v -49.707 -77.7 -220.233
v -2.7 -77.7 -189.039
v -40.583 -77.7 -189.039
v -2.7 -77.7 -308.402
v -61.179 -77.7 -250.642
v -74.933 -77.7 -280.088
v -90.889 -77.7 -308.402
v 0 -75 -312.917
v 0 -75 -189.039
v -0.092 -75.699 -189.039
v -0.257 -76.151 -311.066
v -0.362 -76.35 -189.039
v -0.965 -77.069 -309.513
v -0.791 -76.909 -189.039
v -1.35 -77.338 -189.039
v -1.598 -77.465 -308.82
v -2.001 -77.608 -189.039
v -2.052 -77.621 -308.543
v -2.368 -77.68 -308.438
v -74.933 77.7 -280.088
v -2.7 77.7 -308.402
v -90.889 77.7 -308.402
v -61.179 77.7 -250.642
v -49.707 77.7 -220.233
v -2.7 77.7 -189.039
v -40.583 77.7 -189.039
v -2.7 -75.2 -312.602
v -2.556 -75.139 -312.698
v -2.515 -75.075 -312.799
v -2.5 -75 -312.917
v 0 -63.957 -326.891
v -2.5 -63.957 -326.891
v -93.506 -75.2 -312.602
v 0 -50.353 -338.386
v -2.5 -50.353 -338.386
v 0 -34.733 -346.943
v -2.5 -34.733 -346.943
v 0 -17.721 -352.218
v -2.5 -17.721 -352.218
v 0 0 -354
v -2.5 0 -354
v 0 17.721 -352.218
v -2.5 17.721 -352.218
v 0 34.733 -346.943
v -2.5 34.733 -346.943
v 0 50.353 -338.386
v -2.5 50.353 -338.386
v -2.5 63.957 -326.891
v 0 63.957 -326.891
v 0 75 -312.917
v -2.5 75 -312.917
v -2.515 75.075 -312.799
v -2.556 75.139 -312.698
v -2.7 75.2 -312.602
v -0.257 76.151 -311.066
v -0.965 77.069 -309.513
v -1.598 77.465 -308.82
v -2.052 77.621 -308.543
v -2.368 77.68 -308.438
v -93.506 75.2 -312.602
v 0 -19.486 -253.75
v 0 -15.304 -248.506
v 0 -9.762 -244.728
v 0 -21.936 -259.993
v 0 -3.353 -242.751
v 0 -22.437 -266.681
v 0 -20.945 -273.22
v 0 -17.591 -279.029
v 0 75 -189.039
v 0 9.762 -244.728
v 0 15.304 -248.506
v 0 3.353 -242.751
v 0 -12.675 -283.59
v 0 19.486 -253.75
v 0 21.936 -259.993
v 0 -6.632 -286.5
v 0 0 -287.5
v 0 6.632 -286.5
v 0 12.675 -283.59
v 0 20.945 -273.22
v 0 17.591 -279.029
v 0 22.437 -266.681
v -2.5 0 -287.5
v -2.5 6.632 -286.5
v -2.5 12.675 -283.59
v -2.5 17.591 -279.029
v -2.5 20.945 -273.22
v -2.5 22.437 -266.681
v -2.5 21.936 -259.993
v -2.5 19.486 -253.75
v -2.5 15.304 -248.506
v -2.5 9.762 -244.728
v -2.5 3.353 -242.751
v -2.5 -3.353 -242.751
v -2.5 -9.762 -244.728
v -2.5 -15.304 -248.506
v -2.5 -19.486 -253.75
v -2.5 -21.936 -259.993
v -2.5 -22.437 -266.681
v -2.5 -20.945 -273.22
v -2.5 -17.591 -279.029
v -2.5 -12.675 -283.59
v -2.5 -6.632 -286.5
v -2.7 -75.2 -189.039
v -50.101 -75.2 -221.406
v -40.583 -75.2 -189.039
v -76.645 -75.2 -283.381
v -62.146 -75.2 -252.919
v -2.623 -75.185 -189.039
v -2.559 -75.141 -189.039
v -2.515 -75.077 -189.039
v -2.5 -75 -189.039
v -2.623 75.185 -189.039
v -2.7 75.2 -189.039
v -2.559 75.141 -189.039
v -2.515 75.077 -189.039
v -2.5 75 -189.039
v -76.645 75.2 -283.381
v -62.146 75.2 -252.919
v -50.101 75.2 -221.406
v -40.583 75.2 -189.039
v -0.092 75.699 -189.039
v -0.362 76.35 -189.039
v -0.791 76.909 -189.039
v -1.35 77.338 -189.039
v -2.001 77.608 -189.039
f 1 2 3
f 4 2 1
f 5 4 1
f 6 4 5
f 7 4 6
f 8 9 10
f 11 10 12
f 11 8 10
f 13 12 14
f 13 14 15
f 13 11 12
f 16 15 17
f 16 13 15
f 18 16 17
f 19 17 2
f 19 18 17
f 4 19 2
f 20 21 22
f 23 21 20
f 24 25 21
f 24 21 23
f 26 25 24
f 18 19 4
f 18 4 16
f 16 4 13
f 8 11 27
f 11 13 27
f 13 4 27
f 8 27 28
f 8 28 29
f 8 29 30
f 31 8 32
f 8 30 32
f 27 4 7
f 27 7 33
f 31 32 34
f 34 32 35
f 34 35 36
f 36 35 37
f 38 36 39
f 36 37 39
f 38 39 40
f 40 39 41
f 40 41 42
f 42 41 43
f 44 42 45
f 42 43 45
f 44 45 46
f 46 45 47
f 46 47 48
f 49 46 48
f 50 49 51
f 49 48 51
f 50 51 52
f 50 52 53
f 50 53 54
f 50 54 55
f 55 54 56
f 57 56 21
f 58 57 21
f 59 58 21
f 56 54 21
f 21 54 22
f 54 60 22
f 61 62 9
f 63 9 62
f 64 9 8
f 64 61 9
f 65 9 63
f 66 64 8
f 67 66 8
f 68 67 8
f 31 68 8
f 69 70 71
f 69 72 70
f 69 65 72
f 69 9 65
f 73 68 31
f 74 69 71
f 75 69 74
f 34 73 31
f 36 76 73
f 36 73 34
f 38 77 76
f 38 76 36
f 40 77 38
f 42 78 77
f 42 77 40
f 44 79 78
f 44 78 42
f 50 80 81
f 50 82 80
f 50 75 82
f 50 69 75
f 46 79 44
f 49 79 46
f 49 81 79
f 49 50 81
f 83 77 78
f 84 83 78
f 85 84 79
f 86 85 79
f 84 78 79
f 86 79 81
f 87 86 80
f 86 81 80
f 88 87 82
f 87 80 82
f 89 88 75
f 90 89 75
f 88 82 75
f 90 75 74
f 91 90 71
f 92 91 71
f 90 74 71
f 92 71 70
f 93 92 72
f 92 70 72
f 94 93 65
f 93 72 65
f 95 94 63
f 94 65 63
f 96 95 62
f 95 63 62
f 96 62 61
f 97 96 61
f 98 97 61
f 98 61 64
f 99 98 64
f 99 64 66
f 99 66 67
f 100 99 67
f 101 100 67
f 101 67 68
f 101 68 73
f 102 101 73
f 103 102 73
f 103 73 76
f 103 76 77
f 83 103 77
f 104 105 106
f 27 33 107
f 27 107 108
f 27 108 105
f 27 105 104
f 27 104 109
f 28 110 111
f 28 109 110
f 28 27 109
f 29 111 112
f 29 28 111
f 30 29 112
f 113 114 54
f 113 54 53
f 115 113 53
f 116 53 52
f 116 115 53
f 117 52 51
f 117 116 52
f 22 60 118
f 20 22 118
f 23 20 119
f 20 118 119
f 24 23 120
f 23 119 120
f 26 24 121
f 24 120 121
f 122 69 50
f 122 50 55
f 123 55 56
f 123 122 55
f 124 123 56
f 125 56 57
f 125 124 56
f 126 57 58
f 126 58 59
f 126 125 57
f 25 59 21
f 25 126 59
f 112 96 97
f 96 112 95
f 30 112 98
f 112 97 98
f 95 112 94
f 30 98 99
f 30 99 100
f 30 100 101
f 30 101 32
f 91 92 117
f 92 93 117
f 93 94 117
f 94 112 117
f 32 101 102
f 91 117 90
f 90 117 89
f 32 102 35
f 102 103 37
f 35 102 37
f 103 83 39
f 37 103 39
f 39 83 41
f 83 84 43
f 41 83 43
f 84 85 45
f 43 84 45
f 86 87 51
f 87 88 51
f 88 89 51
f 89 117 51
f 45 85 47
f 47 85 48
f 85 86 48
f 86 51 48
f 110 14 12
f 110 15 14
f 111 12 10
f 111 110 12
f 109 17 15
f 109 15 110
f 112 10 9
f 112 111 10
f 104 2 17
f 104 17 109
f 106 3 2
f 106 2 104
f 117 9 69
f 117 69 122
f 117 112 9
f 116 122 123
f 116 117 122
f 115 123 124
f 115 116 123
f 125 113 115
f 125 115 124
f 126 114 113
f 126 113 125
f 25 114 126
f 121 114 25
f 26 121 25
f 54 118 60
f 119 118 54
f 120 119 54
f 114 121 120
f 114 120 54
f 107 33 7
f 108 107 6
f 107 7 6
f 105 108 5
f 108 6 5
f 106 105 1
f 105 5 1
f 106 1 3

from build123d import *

# Parameters (mm, degrees)
SKETCH1_W               = 730
SKETCH1_H               = 150
BASE_FLANGE1_DEPTH      = 2.5
EDGE_FLANGE1_DEPTH      = 730
EDGE_FLANGE1_BEND_DEPTH = 730
CUT_EXTRUDE1_DEPTH      = 418.461567093
CUT_EXTRUDE1_DEPTH_BACK = 418.461567093
SKETCH12_R              = 434
SKETCH13_R              = 22.5
CUT_EXTRUDE2_DEPTH      = 10
CUT_EXTRUDE3_DEPTH      = 396.173746598
CUT_EXTRUDE3_DEPTH_BACK = 396.173746598
SKETCH14_W              = 631.337566112
SKETCH14_H              = 273.157514278
CUT_EXTRUDE4_DEPTH      = 396.173746598
CUT_EXTRUDE4_DEPTH_BACK = 396.173746598
CUT_EXTRUDE5_DEPTH      = 400.448552929


# Sheet-metal steps are written as plain solids
with BuildPart() as part:
    # Sketch1 → Base-Flange1 (new body)
    with BuildSketch(Plane(origin=(0, 0, 0), x_dir=(0, 0, -1), z_dir=(1, 0, 0))):
        Rectangle(SKETCH1_W, SKETCH1_H)
    extrude(amount=-BASE_FLANGE1_DEPTH)

    # Edge-Flange1 section (across the edge) → Edge-Flange1 (add)
    with BuildSketch(Plane(origin=(-2.5, 75.2, 365), x_dir=(0, -1, 0), z_dir=(0, 0, -1))):
        with BuildLine():
            Line((-2.5, 0.2), (-2.5, 127.5))
            Line((-2.5, 127.5), (0, 127.5))
            Line((0, 127.5), (0, 0.2))
            ThreePointArc((0, 0.2), (0.058578644, 0.058578644), (0.2, 0))
            Line((0.2, 0), (0.2, -2.5))
            ThreePointArc((0.2, -2.5), (-1.709188309, -1.709188309), (-2.5, 0.2))
        make_face()
    extrude(amount=EDGE_FLANGE1_DEPTH)

    # Edge-Flange1 section 2 (across the edge) → Edge-Flange1 bend (add)
    with BuildSketch(Plane(origin=(-2.5, -75.2, -365), x_dir=(0, 1, 0), z_dir=(0, 0, 1))):
        with BuildLine():
            Line((-2.5, 0.2), (-2.5, 127.5))
            Line((-2.5, 127.5), (0, 127.5))
            Line((0, 127.5), (0, 0.2))
            ThreePointArc((0, 0.2), (0.058578644, 0.058578644), (0.2, 0))
            Line((0.2, 0), (0.2, -2.5))
            ThreePointArc((0.2, -2.5), (-1.709188309, -1.709188309), (-2.5, 0.2))
        make_face()
    extrude(amount=EDGE_FLANGE1_BEND_DEPTH)

    # Sketch12 → Cut-Extrude1 (cut, two sides: drawn at the far end of the back side and taken through both)
    with BuildSketch(Plane(origin=(0, 77.7, 0), x_dir=(1, 0, 0), z_dir=(0, 1, 0)).offset(-CUT_EXTRUDE1_DEPTH_BACK)):
        with Locations((-470, 85)):
            Circle(SKETCH12_R)
    extrude(amount=CUT_EXTRUDE1_DEPTH + CUT_EXTRUDE1_DEPTH_BACK, mode=Mode.SUBTRACT)

    # Sketch13 → Cut-Extrude2 (cut)
    with BuildSketch(Plane(origin=(0, 0, 0), x_dir=(0, 0, -1), z_dir=(1, 0, 0))):
        with Locations((265, 0)):
            Circle(SKETCH13_R)
        with Locations((-290, 0)):
            Circle(SKETCH13_R)
    extrude(amount=-CUT_EXTRUDE2_DEPTH, mode=Mode.SUBTRACT)

    # Sketch14 → Cut-Extrude3 (cut, two sides: drawn at the far end of the back side and taken through both)
    with BuildSketch(Plane(origin=(0, 0, 0), x_dir=(0, 0, -1), z_dir=(1, 0, 0)).offset(-CUT_EXTRUDE3_DEPTH_BACK)):
        with Locations((-126.629311255, -14.019673746)):
            Rectangle(SKETCH14_W, SKETCH14_H)
    extrude(amount=CUT_EXTRUDE3_DEPTH + CUT_EXTRUDE3_DEPTH_BACK, mode=Mode.SUBTRACT)

    # Sketch15 → Cut-Extrude4 (cut, two sides: drawn at the far end of the back side and taken through both)
    with BuildSketch(Plane(origin=(0, 0, 0), x_dir=(0, 0, -1), z_dir=(1, 0, 0)).offset(-CUT_EXTRUDE4_DEPTH_BACK)):
        with BuildLine():
            Line((302.266550641, 80.822052704), (310.532003477, 105.351783703))
            Line((310.532003477, 105.351783703), (400.668447303, 94.566226322))
            Line((400.668447303, 94.566226322), (380.252927975, -108.048173048))
            Line((380.252927975, -108.048173048), (291.286888445, -85.029403714))
            ThreePointArc((291.286888445, -85.029403714), (353.805609642, -5.879089735), (302.266550641, 80.822052704))
        make_face()
    extrude(amount=CUT_EXTRUDE4_DEPTH + CUT_EXTRUDE4_DEPTH_BACK, mode=Mode.SUBTRACT)

    # Sketch16 → Cut-Extrude5 (cut, through all)
    with BuildSketch(Plane.XZ.offset(77.7)):
        with BuildLine():
            Line((-39.289490613, -183.753349909), (-75.528167694, -178.562999568))
            Line((-75.528167694, -178.562999568), (-125.004878412, -316.53047916))
            Line((-125.004878412, -316.53047916), (-101.585534734, -324.928922734))
            ThreePointArc((-101.585534734, -324.928922734), (-63.999675541, -257.181937871), (-39.289490613, -183.753349909))
        make_face()
    extrude(amount=-CUT_EXTRUDE5_DEPTH, mode=Mode.SUBTRACT)


solid = part.part
